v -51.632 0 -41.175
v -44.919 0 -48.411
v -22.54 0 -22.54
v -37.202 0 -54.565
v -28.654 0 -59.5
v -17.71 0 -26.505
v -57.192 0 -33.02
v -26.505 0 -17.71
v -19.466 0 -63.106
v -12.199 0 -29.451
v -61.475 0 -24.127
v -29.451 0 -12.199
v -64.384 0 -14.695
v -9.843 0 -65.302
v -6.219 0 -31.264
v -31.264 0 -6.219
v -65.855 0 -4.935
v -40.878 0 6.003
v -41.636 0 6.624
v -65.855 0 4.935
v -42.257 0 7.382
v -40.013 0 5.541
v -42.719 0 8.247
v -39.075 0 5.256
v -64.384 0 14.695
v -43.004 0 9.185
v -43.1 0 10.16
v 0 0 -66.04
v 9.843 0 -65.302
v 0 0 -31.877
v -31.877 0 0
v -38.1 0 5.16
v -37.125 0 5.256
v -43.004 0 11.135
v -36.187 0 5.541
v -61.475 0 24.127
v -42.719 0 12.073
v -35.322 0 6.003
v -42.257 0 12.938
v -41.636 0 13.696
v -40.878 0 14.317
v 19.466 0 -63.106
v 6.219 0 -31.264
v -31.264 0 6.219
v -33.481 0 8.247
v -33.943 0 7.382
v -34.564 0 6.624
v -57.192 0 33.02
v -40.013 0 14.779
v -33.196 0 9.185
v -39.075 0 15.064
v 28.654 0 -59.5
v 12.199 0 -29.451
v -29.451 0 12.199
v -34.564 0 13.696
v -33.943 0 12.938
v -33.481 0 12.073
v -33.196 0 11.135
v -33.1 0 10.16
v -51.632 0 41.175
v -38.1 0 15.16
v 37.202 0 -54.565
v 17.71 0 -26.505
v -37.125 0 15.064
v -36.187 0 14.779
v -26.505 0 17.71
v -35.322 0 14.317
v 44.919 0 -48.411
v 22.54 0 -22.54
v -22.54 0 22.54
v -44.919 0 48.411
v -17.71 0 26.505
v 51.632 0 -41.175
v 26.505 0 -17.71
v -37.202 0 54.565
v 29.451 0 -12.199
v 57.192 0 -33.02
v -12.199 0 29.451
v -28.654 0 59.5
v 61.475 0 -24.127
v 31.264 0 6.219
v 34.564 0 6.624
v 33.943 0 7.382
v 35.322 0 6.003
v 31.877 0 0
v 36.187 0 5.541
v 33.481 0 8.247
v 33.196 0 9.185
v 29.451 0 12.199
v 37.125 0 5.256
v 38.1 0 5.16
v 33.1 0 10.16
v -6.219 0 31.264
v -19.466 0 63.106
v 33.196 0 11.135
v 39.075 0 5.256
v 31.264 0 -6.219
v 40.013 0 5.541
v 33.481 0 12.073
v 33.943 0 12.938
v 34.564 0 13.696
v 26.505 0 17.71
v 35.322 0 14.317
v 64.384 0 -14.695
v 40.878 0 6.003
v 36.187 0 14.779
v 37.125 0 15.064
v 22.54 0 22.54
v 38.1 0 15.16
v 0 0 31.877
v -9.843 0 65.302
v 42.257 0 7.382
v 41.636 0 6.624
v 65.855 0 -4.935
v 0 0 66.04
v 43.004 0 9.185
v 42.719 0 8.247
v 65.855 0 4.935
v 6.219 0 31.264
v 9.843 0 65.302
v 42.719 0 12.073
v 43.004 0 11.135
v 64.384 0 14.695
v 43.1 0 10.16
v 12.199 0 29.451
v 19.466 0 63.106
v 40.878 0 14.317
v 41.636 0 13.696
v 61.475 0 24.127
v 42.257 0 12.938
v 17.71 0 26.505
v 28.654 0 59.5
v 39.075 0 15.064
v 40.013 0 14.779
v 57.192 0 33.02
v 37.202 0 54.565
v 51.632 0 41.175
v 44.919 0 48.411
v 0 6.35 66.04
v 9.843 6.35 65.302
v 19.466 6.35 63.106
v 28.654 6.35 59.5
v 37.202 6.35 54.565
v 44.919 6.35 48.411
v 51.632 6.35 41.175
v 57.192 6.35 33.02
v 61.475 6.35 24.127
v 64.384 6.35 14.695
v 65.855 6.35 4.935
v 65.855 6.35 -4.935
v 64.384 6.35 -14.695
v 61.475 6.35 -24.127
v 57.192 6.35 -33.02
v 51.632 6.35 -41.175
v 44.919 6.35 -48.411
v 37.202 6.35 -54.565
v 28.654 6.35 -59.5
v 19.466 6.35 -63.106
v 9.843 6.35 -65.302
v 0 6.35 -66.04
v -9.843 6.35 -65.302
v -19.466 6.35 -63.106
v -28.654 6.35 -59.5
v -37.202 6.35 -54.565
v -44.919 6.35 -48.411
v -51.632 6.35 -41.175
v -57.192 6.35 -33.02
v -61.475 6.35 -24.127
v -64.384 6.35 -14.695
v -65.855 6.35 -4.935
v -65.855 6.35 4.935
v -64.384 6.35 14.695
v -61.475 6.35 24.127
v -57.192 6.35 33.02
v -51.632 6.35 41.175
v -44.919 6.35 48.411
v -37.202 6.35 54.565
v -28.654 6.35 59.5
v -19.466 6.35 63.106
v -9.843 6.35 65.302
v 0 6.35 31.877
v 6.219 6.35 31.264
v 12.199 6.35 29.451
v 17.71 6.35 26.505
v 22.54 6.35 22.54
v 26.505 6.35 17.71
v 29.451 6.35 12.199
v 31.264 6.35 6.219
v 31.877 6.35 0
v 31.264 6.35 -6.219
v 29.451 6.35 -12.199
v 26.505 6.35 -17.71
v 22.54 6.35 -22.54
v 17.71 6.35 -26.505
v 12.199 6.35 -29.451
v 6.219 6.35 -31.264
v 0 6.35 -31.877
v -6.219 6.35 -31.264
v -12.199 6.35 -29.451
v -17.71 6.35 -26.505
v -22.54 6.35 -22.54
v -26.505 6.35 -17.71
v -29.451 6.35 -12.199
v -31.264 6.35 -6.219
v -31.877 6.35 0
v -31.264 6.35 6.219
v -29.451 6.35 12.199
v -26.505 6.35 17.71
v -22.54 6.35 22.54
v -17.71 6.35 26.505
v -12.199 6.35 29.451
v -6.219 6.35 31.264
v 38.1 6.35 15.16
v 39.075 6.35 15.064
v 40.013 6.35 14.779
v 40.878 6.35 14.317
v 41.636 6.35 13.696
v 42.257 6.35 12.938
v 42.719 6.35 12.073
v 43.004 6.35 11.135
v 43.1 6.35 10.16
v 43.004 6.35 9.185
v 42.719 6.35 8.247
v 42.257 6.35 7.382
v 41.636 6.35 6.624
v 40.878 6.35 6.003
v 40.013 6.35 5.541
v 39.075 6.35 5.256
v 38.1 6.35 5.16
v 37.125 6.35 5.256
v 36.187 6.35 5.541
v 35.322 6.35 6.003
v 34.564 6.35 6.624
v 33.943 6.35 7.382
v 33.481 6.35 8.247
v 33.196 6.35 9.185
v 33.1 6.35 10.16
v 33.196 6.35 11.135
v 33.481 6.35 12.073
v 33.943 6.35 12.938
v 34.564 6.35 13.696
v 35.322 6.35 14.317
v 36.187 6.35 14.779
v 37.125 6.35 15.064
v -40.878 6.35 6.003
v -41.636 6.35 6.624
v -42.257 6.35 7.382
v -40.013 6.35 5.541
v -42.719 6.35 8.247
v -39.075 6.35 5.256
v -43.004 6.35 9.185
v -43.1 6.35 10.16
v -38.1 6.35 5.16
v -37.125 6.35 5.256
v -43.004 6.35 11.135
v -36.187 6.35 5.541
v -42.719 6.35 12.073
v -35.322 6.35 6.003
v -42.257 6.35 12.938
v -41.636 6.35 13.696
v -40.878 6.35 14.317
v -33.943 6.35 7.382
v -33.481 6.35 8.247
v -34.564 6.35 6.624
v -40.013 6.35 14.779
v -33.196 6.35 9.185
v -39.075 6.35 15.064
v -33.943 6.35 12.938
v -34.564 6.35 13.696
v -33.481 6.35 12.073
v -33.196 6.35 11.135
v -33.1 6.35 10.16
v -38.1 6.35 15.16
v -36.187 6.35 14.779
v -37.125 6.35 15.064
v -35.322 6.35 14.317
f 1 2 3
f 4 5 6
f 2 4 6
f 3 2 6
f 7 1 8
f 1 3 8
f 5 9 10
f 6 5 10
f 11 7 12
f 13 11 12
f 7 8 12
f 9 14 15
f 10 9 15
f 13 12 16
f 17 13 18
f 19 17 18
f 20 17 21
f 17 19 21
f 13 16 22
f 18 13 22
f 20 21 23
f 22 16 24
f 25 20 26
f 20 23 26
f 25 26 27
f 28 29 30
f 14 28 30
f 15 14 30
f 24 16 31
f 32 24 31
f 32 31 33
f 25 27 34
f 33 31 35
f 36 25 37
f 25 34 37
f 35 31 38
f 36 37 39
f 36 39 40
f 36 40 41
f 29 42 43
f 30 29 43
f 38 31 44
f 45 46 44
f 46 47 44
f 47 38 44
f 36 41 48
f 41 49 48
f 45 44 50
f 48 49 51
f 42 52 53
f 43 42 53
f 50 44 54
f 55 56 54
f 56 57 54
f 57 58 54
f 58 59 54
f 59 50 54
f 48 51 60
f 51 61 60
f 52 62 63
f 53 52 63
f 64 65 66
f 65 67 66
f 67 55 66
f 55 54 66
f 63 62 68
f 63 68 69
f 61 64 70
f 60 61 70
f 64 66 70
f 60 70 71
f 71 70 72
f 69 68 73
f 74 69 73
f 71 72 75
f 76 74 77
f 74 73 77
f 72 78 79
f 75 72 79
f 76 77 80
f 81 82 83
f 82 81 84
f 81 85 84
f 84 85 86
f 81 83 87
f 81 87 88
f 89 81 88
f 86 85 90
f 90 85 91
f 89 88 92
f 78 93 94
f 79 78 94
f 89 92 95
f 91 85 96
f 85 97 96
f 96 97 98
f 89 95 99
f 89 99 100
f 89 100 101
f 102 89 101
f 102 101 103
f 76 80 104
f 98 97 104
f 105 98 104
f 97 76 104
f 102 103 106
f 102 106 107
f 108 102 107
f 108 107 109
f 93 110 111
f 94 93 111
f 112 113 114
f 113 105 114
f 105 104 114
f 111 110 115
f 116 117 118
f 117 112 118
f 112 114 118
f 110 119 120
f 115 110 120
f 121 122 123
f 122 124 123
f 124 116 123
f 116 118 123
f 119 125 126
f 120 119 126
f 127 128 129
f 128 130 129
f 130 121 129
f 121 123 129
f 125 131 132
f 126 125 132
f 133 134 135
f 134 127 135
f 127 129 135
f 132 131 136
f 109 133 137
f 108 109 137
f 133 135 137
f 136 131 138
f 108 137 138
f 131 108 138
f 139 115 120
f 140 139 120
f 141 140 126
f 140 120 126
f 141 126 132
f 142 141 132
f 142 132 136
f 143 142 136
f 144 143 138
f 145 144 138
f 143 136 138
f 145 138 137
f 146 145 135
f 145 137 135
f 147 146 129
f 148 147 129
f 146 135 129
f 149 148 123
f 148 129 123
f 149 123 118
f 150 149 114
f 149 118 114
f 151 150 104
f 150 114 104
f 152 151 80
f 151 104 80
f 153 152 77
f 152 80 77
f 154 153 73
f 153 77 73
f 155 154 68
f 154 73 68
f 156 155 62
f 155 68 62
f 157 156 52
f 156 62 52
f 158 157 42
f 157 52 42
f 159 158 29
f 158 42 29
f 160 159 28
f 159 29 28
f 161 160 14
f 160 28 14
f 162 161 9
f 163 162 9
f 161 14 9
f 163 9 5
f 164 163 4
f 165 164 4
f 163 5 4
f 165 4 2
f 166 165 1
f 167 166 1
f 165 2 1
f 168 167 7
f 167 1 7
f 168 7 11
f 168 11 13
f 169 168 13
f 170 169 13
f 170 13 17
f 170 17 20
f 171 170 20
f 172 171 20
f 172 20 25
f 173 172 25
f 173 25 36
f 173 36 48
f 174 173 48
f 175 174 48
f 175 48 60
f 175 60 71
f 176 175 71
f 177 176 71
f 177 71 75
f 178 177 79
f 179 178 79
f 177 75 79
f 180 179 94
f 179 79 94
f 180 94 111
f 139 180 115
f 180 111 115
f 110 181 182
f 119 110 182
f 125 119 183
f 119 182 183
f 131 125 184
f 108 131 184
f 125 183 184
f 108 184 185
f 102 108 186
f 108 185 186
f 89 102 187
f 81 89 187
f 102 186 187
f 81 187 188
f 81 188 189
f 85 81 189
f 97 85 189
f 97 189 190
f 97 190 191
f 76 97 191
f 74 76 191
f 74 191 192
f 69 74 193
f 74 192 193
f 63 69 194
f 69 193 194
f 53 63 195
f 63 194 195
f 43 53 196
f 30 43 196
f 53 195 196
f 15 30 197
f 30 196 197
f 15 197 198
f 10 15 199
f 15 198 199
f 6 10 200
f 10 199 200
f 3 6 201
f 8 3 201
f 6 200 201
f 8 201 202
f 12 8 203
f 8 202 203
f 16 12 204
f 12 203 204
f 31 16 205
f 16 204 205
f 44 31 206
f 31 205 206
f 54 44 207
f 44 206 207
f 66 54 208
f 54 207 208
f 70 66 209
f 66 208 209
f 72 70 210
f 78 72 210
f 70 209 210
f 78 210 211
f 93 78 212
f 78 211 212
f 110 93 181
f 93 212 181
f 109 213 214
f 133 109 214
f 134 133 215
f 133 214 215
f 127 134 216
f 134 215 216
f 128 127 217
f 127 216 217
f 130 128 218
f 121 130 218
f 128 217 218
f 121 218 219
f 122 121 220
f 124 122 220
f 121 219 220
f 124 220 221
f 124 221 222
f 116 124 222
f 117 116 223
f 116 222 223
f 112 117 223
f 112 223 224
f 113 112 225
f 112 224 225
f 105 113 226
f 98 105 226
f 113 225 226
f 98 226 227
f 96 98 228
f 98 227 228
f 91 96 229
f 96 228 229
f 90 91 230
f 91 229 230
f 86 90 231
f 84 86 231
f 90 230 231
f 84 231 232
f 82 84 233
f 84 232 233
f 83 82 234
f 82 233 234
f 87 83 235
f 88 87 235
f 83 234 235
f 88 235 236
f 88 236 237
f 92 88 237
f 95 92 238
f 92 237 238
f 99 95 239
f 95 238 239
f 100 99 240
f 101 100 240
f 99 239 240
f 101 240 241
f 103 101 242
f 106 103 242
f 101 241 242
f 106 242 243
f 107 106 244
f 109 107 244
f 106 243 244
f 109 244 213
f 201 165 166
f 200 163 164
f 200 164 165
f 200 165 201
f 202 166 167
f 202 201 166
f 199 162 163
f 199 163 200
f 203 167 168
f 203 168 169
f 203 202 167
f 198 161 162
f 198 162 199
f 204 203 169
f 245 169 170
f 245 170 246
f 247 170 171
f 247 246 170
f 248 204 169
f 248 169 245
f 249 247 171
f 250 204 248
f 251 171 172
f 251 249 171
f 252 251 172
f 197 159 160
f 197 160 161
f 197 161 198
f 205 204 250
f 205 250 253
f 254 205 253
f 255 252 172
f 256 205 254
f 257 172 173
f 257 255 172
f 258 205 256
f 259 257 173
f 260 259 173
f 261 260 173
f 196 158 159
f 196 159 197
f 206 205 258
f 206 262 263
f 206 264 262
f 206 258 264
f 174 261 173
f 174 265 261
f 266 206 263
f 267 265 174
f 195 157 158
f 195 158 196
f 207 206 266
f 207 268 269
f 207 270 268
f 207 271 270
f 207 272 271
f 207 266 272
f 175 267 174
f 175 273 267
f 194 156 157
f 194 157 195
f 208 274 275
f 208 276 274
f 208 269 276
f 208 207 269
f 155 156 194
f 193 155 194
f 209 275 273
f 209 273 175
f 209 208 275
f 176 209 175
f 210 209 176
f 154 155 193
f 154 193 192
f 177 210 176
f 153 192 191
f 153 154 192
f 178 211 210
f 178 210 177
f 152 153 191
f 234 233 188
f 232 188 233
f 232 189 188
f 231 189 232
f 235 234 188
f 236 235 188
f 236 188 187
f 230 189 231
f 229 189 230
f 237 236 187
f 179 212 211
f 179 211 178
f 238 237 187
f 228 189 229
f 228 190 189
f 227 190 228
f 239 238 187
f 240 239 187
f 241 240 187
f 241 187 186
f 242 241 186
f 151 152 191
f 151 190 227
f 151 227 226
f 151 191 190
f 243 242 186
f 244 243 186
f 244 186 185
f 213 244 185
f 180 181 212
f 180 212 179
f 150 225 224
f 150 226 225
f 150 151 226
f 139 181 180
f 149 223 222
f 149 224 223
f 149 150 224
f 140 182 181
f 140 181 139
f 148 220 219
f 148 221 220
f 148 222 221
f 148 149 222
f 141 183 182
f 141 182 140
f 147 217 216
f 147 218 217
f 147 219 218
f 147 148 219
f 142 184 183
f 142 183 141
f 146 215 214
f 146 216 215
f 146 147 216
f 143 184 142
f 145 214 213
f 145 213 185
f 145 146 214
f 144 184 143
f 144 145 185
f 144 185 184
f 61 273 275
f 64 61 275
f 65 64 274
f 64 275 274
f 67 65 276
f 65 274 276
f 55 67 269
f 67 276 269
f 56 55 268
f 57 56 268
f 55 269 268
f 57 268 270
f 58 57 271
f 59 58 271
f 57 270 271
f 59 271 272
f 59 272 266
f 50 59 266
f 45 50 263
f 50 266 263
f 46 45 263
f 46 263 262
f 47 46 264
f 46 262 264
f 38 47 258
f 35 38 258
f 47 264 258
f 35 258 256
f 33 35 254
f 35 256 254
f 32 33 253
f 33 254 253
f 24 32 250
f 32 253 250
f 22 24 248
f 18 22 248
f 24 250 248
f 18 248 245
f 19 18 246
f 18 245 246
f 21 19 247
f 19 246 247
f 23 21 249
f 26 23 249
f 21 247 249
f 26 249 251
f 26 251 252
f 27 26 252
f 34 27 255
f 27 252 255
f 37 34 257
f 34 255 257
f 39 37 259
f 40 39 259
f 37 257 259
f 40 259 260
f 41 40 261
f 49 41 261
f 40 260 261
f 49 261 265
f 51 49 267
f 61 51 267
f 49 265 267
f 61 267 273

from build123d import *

# Parameters (mm, degrees)
SKETCH1_R           = 66.04
BOSS_EXTRUDE1_DEPTH = 6.35
SKETCH2_R           = 31.877
CUT_EXTRUDE1_DEPTH  = 6.35
SKETCH3_R           = 5
CUT_EXTRUDE2_DEPTH  = 6.35


with BuildPart() as part:
    # Sketch1 → Boss-Extrude1 (new body)
    with BuildSketch(Plane(origin=(0, 0, 0), x_dir=(1, 0, 0), z_dir=(0, 1, 0))):
        with Locations(Location((0, 0, 0), (0, 0, 270))):
            Circle(SKETCH1_R)
    extrude(amount=BOSS_EXTRUDE1_DEPTH)

    # Sketch2 → Cut-Extrude1 (cut)
    with BuildSketch(Plane(origin=(0, 6.35, 0), x_dir=(1, 0, 0), z_dir=(0, 1, 0))):
        with Locations(Location((0, 0, 0), (0, 0, 270))):
            Circle(SKETCH2_R)
    extrude(amount=-CUT_EXTRUDE1_DEPTH, mode=Mode.SUBTRACT)

    # Sketch3 → Cut-Extrude2 (cut)
    with BuildSketch(Plane(origin=(0, 6.35, 0), x_dir=(1, 0, 0), z_dir=(0, 1, 0))):
        with Locations(Location((38.1, -10.16, 0), (0, 0, 270))):
            Circle(SKETCH3_R)
        with Locations(Location((-38.1, -10.16, 0), (0, 0, 270))):
            Circle(SKETCH3_R)
    extrude(amount=-CUT_EXTRUDE2_DEPTH, mode=Mode.SUBTRACT)


solid = part.part
